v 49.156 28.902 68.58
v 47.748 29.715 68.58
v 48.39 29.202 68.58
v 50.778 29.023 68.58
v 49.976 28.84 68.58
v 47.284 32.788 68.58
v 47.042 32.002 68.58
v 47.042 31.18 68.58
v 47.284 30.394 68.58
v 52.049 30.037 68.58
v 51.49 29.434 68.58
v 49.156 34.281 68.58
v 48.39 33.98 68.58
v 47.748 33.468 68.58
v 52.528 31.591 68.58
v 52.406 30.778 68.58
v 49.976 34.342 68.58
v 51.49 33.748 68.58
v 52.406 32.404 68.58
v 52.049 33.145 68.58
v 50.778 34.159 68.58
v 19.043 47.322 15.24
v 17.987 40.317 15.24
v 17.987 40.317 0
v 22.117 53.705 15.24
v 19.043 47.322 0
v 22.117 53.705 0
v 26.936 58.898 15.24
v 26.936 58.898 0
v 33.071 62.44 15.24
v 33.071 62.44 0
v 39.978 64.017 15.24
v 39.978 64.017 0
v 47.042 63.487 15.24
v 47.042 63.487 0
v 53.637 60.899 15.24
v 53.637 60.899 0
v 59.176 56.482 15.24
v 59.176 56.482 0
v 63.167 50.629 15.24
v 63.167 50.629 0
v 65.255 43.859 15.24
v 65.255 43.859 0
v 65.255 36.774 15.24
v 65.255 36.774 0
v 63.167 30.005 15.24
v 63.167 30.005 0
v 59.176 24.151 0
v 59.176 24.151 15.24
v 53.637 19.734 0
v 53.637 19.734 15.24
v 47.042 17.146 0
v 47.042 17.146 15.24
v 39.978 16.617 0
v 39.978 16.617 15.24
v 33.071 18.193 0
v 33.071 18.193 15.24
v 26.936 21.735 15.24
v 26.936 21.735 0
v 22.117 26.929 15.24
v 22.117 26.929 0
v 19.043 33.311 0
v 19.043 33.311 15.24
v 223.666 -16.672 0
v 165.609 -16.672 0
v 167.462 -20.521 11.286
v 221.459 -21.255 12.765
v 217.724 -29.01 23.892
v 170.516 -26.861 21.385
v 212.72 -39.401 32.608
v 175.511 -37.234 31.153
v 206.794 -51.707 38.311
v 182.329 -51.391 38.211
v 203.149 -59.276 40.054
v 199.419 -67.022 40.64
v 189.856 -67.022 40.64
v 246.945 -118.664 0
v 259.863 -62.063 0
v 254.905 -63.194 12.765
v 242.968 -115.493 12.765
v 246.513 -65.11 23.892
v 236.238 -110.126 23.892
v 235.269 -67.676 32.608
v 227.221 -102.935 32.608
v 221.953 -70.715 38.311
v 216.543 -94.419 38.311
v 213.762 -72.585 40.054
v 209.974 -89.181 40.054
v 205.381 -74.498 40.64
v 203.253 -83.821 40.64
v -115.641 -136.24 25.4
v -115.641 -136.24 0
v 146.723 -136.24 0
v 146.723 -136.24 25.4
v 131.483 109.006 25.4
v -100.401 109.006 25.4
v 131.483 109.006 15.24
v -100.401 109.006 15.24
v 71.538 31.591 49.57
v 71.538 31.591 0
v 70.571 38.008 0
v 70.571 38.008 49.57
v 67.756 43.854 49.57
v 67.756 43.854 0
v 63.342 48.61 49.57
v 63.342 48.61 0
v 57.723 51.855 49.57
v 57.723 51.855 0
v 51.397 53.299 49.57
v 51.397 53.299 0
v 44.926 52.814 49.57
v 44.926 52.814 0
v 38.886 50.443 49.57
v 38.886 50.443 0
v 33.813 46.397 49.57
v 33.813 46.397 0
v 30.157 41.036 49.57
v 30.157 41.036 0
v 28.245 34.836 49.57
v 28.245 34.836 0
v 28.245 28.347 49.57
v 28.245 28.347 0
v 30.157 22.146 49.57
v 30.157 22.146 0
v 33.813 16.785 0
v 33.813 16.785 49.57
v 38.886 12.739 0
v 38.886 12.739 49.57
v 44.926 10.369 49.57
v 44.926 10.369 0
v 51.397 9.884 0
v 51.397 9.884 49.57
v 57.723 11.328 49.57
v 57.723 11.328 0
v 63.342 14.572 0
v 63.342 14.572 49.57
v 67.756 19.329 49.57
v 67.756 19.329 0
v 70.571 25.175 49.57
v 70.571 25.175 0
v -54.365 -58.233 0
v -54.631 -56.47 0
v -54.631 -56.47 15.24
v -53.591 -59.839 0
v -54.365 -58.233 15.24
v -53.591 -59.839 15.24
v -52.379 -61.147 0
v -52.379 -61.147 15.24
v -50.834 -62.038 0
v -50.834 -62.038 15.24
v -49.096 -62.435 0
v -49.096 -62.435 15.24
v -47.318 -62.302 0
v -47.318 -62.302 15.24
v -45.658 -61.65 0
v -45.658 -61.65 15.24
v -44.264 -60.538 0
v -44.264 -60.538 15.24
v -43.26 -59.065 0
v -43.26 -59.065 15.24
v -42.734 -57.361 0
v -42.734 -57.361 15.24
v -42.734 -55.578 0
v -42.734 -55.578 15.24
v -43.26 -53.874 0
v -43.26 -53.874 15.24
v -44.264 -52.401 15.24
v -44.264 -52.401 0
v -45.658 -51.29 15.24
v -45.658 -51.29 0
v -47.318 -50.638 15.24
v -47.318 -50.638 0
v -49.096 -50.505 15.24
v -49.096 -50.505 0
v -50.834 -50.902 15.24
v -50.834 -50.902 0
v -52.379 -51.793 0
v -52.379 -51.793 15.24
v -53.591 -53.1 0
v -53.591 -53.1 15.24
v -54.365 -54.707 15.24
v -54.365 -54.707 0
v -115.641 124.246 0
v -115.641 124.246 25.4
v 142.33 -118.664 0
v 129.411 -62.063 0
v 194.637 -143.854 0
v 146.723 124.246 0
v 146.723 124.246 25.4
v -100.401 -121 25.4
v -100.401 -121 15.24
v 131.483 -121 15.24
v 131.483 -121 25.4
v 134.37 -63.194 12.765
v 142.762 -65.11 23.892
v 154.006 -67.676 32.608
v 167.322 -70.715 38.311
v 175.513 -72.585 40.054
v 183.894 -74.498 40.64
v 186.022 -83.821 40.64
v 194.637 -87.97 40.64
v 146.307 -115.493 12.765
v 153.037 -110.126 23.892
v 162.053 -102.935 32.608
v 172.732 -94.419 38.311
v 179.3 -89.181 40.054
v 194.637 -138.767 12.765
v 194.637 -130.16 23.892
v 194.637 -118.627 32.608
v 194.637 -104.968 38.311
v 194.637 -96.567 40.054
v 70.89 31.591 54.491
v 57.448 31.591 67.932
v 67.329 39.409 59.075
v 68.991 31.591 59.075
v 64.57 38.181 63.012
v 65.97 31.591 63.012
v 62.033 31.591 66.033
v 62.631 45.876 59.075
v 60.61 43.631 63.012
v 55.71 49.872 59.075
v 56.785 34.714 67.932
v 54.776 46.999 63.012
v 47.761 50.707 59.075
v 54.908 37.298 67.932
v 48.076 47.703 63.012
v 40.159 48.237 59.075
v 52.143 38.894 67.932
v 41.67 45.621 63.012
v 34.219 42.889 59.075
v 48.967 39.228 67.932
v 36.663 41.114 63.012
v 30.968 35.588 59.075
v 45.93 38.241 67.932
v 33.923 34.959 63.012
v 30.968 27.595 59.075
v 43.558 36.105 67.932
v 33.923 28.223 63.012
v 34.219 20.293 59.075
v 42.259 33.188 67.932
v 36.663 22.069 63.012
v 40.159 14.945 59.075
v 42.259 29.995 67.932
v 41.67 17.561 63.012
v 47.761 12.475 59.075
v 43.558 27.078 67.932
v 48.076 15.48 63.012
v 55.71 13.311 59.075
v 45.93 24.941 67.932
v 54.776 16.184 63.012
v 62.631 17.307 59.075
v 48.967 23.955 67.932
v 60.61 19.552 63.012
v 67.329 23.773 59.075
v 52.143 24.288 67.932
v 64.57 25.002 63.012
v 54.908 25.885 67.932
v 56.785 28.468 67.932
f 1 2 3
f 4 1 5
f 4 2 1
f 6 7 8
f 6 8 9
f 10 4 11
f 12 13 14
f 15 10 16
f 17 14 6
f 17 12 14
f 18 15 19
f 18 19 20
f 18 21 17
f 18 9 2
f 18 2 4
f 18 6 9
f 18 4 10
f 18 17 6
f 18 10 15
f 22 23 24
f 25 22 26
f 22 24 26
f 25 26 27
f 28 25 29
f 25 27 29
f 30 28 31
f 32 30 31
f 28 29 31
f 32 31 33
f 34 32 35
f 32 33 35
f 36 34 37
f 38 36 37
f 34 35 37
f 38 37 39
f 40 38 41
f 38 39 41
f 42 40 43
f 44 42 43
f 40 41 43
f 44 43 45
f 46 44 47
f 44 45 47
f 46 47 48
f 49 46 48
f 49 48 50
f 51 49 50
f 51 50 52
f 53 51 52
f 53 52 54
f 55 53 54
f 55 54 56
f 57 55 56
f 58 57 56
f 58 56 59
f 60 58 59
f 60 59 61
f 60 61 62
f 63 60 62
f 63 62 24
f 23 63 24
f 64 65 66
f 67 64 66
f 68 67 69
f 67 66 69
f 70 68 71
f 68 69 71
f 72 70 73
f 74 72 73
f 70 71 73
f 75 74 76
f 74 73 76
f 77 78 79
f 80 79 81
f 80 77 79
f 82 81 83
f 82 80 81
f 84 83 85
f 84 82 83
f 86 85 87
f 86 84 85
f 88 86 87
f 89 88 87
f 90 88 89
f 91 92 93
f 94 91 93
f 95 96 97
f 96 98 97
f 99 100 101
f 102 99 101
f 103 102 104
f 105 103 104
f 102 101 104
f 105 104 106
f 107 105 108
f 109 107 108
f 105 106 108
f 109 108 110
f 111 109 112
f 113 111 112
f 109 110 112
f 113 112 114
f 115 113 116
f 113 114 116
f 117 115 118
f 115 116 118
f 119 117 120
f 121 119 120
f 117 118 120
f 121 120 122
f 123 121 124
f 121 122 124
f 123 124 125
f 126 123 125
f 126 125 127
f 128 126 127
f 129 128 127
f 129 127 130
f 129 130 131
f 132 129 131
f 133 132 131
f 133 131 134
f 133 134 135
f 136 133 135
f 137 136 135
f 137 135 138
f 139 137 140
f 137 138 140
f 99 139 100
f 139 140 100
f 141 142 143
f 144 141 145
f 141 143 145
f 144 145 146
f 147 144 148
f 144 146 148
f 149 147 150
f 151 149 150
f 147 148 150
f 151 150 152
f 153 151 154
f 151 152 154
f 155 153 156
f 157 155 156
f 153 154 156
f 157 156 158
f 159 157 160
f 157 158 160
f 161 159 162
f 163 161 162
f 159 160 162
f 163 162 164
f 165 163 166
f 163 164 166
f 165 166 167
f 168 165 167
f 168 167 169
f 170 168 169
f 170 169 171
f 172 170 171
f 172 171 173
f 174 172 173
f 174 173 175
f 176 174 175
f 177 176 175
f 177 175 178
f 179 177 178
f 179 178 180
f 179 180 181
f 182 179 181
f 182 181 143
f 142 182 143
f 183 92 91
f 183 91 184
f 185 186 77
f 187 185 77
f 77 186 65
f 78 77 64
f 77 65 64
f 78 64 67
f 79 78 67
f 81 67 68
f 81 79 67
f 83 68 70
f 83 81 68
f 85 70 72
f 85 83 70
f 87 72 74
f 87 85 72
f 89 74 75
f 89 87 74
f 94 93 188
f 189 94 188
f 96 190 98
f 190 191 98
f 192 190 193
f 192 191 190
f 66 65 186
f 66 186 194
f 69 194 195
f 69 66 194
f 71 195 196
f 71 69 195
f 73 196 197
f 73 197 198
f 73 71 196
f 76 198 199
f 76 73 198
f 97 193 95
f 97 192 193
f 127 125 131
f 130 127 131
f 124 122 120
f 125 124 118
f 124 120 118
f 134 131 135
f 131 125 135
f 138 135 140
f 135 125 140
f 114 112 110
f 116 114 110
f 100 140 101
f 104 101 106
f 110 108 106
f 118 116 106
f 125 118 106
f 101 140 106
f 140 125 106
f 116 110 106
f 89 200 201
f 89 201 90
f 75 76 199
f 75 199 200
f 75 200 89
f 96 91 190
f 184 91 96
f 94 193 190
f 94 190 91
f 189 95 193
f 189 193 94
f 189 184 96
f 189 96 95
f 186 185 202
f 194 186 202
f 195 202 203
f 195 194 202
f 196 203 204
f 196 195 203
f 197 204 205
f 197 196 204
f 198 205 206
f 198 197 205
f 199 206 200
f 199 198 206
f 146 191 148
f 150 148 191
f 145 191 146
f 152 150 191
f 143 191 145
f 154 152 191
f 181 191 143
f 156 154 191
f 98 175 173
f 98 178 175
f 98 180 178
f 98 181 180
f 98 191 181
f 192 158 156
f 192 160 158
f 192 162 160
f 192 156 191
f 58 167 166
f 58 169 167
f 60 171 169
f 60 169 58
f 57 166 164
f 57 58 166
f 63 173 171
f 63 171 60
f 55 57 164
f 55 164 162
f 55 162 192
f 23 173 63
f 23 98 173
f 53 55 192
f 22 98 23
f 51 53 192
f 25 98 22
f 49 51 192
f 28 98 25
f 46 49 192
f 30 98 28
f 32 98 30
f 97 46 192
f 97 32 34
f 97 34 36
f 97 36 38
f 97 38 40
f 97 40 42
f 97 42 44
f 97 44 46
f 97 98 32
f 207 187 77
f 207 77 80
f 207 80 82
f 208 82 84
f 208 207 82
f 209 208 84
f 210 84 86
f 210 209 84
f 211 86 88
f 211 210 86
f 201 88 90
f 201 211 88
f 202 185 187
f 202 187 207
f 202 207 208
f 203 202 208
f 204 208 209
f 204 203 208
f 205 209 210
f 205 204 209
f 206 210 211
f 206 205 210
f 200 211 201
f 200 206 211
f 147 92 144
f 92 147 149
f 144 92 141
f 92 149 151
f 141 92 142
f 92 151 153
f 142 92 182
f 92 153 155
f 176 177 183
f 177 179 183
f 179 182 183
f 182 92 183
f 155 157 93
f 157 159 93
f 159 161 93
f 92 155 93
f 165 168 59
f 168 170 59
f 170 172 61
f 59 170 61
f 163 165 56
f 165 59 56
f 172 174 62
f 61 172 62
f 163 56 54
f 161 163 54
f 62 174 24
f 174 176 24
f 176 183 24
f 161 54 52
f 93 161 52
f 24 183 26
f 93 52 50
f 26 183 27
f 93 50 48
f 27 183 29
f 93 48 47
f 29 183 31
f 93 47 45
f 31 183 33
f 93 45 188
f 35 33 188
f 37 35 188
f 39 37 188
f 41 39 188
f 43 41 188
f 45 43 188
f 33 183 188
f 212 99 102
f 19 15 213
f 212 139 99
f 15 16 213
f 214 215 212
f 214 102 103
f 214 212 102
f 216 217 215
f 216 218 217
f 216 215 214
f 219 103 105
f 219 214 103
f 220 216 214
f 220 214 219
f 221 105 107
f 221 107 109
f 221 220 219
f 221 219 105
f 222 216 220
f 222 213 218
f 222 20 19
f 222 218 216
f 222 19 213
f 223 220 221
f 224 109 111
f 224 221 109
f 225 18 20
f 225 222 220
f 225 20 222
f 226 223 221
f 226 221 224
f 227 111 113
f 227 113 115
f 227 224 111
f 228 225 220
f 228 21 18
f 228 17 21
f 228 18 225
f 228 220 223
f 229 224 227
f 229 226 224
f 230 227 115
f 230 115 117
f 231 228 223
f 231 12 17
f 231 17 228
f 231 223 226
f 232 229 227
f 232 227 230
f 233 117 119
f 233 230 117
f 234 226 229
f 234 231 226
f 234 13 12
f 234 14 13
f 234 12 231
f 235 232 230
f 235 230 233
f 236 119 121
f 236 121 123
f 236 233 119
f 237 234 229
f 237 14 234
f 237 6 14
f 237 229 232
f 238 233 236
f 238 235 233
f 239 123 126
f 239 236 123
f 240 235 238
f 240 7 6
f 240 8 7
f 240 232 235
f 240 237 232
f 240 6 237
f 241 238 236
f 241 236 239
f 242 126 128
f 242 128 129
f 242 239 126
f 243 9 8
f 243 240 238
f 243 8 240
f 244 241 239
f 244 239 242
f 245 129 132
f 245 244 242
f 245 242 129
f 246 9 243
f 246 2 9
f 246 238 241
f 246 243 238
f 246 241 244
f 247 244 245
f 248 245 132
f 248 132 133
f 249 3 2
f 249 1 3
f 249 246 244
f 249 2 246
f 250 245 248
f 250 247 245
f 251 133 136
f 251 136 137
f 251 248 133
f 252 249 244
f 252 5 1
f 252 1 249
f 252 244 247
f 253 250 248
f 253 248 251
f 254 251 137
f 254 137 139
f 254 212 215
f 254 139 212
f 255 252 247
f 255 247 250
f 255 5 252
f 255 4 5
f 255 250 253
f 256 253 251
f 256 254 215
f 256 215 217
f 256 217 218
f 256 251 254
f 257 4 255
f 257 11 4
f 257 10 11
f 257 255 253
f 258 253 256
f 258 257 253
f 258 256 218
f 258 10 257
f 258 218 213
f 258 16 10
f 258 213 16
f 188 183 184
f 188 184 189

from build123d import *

# Parameters (mm, degrees)
F2_W          = 262.36371696
F2_H          = 260.4859247804
F3_DEPTH      = 25.4
F6_T          = -15.24
F8_D          = 47.533052
F9_R          = 21.7682047425
F10_DEPTH     = 68.58
F11_R         = 19.0095175901
F13_DEPTH     = 40.64
F14_T1_DEPTH  = 309.8053408432
F14_T3_DEPTH  = 309.8053408432
F14_T5_DEPTH  = 309.8053408432
F14_T7_DEPTH  = 309.8053408432
F14_T9_DEPTH  = 309.8053408432
F14_T11_DEPTH = 309.8053408432
F14_T13_DEPTH = 309.8053408432
F15_D         = 11.9634


# Not quite as in the source:
# - a fillet or chamfer that OpenCascade refuses, or shapes differently, is made with other operations: its cross-section is extruded or revolved along the edge and cut away or added
# - the program builds the solid bodies; features that only make, move or delete a surface that nothing else refers to are left out


with BuildPart() as f3:
    # F2 (on Top) → F3 (new body)
    with BuildSketch(Plane.XY):
        with Locations((15.5406966805, -5.9967003763)):
            Rectangle(F2_W, F2_H)
    extrude(amount=F3_DEPTH)

    # F6
    f6_openings = [f3.faces().sort_by_distance(p)[0] for p in [
        (15.540697, -5.9967, 25.4),
    ]]
    offset(amount=F6_T, openings=f6_openings)

    # F8 (through all)
    with Locations(Plane.XY.offset(15.24)):
        with Locations((41.753936559, 40.3167158365)):
            Hole(F8_D / 2)

    # F15 (through all)
    with Locations(Plane(origin=(0, 0, 0), x_dir=(1, 0, 0), z_dir=(0, 0, -1))):
        with Locations((-48.6491061747, 56.4698465168)):
            Hole(F15_D / 2)


with BuildPart() as f10:
    # F9 (on Top) → F10 (new body)
    with BuildSketch(Plane.XY):
        with Locations((49.7697815299, 31.5912254155)):
            Circle(F9_R)
    extrude(amount=F10_DEPTH)

    # F11
    f11_edges = [f10.edges().sort_by_distance(p)[0] for p in [
        (28.001577, 31.591225, 68.58),
    ]]
    fillet(f11_edges, radius=F11_R)


with BuildPart() as f13:
    # F12 (on Top) → F13 (new body)
    with BuildSketch(Plane.XY):
        Polygon((223.6656961674, -16.6721306741), (165.6090202099, -16.6721306741), (129.4112748206, -62.0626677051), (142.330100577, -118.6637415846), (194.6373581886, -143.8535892298), (246.9446158002, -118.6637415846), (259.8634415567, -62.0626677051), align=None)
    extrude(amount=F13_DEPTH)

    # F14: fillet of radius 51.5096605668 on 7 edges, made by hand

    # F14_s2 → F14_t1 (cut)
    with BuildSketch(Plane(origin=(209.7538690392, -263.0230324464, 0), x_dir=(0, 0, 1), z_dir=(-0.6234898019, 0.7818314825, 0))):
        with BuildLine():
            ThreePointArc((0, 164.4739793612), (29.2123656917, 146.4766234639), (40.64, 114.1242463841))
            Line((40.64, 114.1242463841), (40.64, 164.4739793612))
            Line((40.64, 164.4739793612), (0, 164.4739793612))
        make_face()
    extrude(amount=F14_T1_DEPTH, mode=Mode.SUBTRACT)

    # F14_s4 → F14_t3 (cut)
    with BuildSketch(Plane.YZ.offset(39.734687767)):
        with BuildLine():
            ThreePointArc((-16.6721306741, 0), (-34.6694865714, 29.2123656917), (-67.0218636513, 40.64))
            Line((-67.0218636513, 40.64), (-16.6721306741, 40.64))
            Line((-16.6721306741, 40.64), (-16.6721306741, 0))
        make_face()
    extrude(amount=F14_T3_DEPTH, mode=Mode.SUBTRACT)

    # F14_s6 → F14_t5 (cut)
    with BuildSketch(Plane(origin=(134.7330729996, 168.9499297129, 0), x_dir=(0, 0, 1), z_dir=(-0.6234898019, -0.7818314825, 0))):
        with BuildLine():
            ThreePointArc((0, -139.8732492313), (29.2123656917, -157.8706051286), (40.64, -190.2229822085))
            Line((40.64, -190.2229822085), (40.64, -139.8732492313))
            Line((40.64, -139.8732492313), (0, -139.8732492313))
        make_face()
    extrude(amount=F14_T5_DEPTH, mode=Mode.SUBTRACT)

    # F14_s8 → F14_t7 (cut)
    with BuildSketch(Plane(origin=(-8.1378103287, 35.654076641, 0), x_dir=(0, 0, 1), z_dir=(0.222520934, -0.9749279122, 0))):
        with BuildLine():
            ThreePointArc((0, -112.356421192), (29.2123656917, -130.3537770893), (40.64, -162.7061541692))
            Line((40.64, -162.7061541692), (40.64, -112.356421192))
            Line((40.64, -112.356421192), (0, -112.356421192))
        make_face()
    extrude(amount=F14_T7_DEPTH, mode=Mode.SUBTRACT)

    # F14_s10 → F14_t9 (cut)
    with BuildSketch(Plane(origin=(48.5144030923, -23.3633051759, 0), x_dir=(0, 0, 1), z_dir=(0.9009688679, -0.4338837391, 0))):
        with BuildLine():
            ThreePointArc((0, 45.1576206892), (29.2123656917, 27.1602647919), (40.64, -5.1921122879))
            Line((40.64, -5.1921122879), (40.64, 45.1576206892))
            Line((40.64, 45.1576206892), (0, 45.1576206892))
        make_face()
    extrude(amount=F14_T9_DEPTH, mode=Mode.SUBTRACT)

    # F14_s12 → F14_t11 (cut)
    with BuildSketch(Plane(origin=(-11.6476042219, -5.6091905632, 0), x_dir=(0, 0, 1), z_dir=(0.9009688679, 0.4338837391, 0))):
        with BuildLine():
            ThreePointArc((0, 214.0575901749), (29.2123656917, 196.0602342776), (40.64, 163.7078571978))
            Line((40.64, 163.7078571978), (40.64, 214.0575901749))
            Line((40.64, 214.0575901749), (0, 214.0575901749))
        make_face()
    extrude(amount=F14_T11_DEPTH, mode=Mode.SUBTRACT)

    # F14_s14 → F14_t13 (cut)
    with BuildSketch(Plane(origin=(-41.5252055305, -181.9338127472, 0), x_dir=(0, 0, 1), z_dir=(0.222520934, 0.9749279122, 0))):
        with BuildLine():
            ThreePointArc((0, 267.1583653108), (29.2123656917, 249.1610094135), (40.64, 216.8086323337))
            Line((40.64, 216.8086323337), (40.64, 267.1583653108))
            Line((40.64, 267.1583653108), (0, 267.1583653108))
        make_face()
    extrude(amount=F14_T13_DEPTH, mode=Mode.SUBTRACT)


solid = Compound([f3.part, f10.part, f13.part])
